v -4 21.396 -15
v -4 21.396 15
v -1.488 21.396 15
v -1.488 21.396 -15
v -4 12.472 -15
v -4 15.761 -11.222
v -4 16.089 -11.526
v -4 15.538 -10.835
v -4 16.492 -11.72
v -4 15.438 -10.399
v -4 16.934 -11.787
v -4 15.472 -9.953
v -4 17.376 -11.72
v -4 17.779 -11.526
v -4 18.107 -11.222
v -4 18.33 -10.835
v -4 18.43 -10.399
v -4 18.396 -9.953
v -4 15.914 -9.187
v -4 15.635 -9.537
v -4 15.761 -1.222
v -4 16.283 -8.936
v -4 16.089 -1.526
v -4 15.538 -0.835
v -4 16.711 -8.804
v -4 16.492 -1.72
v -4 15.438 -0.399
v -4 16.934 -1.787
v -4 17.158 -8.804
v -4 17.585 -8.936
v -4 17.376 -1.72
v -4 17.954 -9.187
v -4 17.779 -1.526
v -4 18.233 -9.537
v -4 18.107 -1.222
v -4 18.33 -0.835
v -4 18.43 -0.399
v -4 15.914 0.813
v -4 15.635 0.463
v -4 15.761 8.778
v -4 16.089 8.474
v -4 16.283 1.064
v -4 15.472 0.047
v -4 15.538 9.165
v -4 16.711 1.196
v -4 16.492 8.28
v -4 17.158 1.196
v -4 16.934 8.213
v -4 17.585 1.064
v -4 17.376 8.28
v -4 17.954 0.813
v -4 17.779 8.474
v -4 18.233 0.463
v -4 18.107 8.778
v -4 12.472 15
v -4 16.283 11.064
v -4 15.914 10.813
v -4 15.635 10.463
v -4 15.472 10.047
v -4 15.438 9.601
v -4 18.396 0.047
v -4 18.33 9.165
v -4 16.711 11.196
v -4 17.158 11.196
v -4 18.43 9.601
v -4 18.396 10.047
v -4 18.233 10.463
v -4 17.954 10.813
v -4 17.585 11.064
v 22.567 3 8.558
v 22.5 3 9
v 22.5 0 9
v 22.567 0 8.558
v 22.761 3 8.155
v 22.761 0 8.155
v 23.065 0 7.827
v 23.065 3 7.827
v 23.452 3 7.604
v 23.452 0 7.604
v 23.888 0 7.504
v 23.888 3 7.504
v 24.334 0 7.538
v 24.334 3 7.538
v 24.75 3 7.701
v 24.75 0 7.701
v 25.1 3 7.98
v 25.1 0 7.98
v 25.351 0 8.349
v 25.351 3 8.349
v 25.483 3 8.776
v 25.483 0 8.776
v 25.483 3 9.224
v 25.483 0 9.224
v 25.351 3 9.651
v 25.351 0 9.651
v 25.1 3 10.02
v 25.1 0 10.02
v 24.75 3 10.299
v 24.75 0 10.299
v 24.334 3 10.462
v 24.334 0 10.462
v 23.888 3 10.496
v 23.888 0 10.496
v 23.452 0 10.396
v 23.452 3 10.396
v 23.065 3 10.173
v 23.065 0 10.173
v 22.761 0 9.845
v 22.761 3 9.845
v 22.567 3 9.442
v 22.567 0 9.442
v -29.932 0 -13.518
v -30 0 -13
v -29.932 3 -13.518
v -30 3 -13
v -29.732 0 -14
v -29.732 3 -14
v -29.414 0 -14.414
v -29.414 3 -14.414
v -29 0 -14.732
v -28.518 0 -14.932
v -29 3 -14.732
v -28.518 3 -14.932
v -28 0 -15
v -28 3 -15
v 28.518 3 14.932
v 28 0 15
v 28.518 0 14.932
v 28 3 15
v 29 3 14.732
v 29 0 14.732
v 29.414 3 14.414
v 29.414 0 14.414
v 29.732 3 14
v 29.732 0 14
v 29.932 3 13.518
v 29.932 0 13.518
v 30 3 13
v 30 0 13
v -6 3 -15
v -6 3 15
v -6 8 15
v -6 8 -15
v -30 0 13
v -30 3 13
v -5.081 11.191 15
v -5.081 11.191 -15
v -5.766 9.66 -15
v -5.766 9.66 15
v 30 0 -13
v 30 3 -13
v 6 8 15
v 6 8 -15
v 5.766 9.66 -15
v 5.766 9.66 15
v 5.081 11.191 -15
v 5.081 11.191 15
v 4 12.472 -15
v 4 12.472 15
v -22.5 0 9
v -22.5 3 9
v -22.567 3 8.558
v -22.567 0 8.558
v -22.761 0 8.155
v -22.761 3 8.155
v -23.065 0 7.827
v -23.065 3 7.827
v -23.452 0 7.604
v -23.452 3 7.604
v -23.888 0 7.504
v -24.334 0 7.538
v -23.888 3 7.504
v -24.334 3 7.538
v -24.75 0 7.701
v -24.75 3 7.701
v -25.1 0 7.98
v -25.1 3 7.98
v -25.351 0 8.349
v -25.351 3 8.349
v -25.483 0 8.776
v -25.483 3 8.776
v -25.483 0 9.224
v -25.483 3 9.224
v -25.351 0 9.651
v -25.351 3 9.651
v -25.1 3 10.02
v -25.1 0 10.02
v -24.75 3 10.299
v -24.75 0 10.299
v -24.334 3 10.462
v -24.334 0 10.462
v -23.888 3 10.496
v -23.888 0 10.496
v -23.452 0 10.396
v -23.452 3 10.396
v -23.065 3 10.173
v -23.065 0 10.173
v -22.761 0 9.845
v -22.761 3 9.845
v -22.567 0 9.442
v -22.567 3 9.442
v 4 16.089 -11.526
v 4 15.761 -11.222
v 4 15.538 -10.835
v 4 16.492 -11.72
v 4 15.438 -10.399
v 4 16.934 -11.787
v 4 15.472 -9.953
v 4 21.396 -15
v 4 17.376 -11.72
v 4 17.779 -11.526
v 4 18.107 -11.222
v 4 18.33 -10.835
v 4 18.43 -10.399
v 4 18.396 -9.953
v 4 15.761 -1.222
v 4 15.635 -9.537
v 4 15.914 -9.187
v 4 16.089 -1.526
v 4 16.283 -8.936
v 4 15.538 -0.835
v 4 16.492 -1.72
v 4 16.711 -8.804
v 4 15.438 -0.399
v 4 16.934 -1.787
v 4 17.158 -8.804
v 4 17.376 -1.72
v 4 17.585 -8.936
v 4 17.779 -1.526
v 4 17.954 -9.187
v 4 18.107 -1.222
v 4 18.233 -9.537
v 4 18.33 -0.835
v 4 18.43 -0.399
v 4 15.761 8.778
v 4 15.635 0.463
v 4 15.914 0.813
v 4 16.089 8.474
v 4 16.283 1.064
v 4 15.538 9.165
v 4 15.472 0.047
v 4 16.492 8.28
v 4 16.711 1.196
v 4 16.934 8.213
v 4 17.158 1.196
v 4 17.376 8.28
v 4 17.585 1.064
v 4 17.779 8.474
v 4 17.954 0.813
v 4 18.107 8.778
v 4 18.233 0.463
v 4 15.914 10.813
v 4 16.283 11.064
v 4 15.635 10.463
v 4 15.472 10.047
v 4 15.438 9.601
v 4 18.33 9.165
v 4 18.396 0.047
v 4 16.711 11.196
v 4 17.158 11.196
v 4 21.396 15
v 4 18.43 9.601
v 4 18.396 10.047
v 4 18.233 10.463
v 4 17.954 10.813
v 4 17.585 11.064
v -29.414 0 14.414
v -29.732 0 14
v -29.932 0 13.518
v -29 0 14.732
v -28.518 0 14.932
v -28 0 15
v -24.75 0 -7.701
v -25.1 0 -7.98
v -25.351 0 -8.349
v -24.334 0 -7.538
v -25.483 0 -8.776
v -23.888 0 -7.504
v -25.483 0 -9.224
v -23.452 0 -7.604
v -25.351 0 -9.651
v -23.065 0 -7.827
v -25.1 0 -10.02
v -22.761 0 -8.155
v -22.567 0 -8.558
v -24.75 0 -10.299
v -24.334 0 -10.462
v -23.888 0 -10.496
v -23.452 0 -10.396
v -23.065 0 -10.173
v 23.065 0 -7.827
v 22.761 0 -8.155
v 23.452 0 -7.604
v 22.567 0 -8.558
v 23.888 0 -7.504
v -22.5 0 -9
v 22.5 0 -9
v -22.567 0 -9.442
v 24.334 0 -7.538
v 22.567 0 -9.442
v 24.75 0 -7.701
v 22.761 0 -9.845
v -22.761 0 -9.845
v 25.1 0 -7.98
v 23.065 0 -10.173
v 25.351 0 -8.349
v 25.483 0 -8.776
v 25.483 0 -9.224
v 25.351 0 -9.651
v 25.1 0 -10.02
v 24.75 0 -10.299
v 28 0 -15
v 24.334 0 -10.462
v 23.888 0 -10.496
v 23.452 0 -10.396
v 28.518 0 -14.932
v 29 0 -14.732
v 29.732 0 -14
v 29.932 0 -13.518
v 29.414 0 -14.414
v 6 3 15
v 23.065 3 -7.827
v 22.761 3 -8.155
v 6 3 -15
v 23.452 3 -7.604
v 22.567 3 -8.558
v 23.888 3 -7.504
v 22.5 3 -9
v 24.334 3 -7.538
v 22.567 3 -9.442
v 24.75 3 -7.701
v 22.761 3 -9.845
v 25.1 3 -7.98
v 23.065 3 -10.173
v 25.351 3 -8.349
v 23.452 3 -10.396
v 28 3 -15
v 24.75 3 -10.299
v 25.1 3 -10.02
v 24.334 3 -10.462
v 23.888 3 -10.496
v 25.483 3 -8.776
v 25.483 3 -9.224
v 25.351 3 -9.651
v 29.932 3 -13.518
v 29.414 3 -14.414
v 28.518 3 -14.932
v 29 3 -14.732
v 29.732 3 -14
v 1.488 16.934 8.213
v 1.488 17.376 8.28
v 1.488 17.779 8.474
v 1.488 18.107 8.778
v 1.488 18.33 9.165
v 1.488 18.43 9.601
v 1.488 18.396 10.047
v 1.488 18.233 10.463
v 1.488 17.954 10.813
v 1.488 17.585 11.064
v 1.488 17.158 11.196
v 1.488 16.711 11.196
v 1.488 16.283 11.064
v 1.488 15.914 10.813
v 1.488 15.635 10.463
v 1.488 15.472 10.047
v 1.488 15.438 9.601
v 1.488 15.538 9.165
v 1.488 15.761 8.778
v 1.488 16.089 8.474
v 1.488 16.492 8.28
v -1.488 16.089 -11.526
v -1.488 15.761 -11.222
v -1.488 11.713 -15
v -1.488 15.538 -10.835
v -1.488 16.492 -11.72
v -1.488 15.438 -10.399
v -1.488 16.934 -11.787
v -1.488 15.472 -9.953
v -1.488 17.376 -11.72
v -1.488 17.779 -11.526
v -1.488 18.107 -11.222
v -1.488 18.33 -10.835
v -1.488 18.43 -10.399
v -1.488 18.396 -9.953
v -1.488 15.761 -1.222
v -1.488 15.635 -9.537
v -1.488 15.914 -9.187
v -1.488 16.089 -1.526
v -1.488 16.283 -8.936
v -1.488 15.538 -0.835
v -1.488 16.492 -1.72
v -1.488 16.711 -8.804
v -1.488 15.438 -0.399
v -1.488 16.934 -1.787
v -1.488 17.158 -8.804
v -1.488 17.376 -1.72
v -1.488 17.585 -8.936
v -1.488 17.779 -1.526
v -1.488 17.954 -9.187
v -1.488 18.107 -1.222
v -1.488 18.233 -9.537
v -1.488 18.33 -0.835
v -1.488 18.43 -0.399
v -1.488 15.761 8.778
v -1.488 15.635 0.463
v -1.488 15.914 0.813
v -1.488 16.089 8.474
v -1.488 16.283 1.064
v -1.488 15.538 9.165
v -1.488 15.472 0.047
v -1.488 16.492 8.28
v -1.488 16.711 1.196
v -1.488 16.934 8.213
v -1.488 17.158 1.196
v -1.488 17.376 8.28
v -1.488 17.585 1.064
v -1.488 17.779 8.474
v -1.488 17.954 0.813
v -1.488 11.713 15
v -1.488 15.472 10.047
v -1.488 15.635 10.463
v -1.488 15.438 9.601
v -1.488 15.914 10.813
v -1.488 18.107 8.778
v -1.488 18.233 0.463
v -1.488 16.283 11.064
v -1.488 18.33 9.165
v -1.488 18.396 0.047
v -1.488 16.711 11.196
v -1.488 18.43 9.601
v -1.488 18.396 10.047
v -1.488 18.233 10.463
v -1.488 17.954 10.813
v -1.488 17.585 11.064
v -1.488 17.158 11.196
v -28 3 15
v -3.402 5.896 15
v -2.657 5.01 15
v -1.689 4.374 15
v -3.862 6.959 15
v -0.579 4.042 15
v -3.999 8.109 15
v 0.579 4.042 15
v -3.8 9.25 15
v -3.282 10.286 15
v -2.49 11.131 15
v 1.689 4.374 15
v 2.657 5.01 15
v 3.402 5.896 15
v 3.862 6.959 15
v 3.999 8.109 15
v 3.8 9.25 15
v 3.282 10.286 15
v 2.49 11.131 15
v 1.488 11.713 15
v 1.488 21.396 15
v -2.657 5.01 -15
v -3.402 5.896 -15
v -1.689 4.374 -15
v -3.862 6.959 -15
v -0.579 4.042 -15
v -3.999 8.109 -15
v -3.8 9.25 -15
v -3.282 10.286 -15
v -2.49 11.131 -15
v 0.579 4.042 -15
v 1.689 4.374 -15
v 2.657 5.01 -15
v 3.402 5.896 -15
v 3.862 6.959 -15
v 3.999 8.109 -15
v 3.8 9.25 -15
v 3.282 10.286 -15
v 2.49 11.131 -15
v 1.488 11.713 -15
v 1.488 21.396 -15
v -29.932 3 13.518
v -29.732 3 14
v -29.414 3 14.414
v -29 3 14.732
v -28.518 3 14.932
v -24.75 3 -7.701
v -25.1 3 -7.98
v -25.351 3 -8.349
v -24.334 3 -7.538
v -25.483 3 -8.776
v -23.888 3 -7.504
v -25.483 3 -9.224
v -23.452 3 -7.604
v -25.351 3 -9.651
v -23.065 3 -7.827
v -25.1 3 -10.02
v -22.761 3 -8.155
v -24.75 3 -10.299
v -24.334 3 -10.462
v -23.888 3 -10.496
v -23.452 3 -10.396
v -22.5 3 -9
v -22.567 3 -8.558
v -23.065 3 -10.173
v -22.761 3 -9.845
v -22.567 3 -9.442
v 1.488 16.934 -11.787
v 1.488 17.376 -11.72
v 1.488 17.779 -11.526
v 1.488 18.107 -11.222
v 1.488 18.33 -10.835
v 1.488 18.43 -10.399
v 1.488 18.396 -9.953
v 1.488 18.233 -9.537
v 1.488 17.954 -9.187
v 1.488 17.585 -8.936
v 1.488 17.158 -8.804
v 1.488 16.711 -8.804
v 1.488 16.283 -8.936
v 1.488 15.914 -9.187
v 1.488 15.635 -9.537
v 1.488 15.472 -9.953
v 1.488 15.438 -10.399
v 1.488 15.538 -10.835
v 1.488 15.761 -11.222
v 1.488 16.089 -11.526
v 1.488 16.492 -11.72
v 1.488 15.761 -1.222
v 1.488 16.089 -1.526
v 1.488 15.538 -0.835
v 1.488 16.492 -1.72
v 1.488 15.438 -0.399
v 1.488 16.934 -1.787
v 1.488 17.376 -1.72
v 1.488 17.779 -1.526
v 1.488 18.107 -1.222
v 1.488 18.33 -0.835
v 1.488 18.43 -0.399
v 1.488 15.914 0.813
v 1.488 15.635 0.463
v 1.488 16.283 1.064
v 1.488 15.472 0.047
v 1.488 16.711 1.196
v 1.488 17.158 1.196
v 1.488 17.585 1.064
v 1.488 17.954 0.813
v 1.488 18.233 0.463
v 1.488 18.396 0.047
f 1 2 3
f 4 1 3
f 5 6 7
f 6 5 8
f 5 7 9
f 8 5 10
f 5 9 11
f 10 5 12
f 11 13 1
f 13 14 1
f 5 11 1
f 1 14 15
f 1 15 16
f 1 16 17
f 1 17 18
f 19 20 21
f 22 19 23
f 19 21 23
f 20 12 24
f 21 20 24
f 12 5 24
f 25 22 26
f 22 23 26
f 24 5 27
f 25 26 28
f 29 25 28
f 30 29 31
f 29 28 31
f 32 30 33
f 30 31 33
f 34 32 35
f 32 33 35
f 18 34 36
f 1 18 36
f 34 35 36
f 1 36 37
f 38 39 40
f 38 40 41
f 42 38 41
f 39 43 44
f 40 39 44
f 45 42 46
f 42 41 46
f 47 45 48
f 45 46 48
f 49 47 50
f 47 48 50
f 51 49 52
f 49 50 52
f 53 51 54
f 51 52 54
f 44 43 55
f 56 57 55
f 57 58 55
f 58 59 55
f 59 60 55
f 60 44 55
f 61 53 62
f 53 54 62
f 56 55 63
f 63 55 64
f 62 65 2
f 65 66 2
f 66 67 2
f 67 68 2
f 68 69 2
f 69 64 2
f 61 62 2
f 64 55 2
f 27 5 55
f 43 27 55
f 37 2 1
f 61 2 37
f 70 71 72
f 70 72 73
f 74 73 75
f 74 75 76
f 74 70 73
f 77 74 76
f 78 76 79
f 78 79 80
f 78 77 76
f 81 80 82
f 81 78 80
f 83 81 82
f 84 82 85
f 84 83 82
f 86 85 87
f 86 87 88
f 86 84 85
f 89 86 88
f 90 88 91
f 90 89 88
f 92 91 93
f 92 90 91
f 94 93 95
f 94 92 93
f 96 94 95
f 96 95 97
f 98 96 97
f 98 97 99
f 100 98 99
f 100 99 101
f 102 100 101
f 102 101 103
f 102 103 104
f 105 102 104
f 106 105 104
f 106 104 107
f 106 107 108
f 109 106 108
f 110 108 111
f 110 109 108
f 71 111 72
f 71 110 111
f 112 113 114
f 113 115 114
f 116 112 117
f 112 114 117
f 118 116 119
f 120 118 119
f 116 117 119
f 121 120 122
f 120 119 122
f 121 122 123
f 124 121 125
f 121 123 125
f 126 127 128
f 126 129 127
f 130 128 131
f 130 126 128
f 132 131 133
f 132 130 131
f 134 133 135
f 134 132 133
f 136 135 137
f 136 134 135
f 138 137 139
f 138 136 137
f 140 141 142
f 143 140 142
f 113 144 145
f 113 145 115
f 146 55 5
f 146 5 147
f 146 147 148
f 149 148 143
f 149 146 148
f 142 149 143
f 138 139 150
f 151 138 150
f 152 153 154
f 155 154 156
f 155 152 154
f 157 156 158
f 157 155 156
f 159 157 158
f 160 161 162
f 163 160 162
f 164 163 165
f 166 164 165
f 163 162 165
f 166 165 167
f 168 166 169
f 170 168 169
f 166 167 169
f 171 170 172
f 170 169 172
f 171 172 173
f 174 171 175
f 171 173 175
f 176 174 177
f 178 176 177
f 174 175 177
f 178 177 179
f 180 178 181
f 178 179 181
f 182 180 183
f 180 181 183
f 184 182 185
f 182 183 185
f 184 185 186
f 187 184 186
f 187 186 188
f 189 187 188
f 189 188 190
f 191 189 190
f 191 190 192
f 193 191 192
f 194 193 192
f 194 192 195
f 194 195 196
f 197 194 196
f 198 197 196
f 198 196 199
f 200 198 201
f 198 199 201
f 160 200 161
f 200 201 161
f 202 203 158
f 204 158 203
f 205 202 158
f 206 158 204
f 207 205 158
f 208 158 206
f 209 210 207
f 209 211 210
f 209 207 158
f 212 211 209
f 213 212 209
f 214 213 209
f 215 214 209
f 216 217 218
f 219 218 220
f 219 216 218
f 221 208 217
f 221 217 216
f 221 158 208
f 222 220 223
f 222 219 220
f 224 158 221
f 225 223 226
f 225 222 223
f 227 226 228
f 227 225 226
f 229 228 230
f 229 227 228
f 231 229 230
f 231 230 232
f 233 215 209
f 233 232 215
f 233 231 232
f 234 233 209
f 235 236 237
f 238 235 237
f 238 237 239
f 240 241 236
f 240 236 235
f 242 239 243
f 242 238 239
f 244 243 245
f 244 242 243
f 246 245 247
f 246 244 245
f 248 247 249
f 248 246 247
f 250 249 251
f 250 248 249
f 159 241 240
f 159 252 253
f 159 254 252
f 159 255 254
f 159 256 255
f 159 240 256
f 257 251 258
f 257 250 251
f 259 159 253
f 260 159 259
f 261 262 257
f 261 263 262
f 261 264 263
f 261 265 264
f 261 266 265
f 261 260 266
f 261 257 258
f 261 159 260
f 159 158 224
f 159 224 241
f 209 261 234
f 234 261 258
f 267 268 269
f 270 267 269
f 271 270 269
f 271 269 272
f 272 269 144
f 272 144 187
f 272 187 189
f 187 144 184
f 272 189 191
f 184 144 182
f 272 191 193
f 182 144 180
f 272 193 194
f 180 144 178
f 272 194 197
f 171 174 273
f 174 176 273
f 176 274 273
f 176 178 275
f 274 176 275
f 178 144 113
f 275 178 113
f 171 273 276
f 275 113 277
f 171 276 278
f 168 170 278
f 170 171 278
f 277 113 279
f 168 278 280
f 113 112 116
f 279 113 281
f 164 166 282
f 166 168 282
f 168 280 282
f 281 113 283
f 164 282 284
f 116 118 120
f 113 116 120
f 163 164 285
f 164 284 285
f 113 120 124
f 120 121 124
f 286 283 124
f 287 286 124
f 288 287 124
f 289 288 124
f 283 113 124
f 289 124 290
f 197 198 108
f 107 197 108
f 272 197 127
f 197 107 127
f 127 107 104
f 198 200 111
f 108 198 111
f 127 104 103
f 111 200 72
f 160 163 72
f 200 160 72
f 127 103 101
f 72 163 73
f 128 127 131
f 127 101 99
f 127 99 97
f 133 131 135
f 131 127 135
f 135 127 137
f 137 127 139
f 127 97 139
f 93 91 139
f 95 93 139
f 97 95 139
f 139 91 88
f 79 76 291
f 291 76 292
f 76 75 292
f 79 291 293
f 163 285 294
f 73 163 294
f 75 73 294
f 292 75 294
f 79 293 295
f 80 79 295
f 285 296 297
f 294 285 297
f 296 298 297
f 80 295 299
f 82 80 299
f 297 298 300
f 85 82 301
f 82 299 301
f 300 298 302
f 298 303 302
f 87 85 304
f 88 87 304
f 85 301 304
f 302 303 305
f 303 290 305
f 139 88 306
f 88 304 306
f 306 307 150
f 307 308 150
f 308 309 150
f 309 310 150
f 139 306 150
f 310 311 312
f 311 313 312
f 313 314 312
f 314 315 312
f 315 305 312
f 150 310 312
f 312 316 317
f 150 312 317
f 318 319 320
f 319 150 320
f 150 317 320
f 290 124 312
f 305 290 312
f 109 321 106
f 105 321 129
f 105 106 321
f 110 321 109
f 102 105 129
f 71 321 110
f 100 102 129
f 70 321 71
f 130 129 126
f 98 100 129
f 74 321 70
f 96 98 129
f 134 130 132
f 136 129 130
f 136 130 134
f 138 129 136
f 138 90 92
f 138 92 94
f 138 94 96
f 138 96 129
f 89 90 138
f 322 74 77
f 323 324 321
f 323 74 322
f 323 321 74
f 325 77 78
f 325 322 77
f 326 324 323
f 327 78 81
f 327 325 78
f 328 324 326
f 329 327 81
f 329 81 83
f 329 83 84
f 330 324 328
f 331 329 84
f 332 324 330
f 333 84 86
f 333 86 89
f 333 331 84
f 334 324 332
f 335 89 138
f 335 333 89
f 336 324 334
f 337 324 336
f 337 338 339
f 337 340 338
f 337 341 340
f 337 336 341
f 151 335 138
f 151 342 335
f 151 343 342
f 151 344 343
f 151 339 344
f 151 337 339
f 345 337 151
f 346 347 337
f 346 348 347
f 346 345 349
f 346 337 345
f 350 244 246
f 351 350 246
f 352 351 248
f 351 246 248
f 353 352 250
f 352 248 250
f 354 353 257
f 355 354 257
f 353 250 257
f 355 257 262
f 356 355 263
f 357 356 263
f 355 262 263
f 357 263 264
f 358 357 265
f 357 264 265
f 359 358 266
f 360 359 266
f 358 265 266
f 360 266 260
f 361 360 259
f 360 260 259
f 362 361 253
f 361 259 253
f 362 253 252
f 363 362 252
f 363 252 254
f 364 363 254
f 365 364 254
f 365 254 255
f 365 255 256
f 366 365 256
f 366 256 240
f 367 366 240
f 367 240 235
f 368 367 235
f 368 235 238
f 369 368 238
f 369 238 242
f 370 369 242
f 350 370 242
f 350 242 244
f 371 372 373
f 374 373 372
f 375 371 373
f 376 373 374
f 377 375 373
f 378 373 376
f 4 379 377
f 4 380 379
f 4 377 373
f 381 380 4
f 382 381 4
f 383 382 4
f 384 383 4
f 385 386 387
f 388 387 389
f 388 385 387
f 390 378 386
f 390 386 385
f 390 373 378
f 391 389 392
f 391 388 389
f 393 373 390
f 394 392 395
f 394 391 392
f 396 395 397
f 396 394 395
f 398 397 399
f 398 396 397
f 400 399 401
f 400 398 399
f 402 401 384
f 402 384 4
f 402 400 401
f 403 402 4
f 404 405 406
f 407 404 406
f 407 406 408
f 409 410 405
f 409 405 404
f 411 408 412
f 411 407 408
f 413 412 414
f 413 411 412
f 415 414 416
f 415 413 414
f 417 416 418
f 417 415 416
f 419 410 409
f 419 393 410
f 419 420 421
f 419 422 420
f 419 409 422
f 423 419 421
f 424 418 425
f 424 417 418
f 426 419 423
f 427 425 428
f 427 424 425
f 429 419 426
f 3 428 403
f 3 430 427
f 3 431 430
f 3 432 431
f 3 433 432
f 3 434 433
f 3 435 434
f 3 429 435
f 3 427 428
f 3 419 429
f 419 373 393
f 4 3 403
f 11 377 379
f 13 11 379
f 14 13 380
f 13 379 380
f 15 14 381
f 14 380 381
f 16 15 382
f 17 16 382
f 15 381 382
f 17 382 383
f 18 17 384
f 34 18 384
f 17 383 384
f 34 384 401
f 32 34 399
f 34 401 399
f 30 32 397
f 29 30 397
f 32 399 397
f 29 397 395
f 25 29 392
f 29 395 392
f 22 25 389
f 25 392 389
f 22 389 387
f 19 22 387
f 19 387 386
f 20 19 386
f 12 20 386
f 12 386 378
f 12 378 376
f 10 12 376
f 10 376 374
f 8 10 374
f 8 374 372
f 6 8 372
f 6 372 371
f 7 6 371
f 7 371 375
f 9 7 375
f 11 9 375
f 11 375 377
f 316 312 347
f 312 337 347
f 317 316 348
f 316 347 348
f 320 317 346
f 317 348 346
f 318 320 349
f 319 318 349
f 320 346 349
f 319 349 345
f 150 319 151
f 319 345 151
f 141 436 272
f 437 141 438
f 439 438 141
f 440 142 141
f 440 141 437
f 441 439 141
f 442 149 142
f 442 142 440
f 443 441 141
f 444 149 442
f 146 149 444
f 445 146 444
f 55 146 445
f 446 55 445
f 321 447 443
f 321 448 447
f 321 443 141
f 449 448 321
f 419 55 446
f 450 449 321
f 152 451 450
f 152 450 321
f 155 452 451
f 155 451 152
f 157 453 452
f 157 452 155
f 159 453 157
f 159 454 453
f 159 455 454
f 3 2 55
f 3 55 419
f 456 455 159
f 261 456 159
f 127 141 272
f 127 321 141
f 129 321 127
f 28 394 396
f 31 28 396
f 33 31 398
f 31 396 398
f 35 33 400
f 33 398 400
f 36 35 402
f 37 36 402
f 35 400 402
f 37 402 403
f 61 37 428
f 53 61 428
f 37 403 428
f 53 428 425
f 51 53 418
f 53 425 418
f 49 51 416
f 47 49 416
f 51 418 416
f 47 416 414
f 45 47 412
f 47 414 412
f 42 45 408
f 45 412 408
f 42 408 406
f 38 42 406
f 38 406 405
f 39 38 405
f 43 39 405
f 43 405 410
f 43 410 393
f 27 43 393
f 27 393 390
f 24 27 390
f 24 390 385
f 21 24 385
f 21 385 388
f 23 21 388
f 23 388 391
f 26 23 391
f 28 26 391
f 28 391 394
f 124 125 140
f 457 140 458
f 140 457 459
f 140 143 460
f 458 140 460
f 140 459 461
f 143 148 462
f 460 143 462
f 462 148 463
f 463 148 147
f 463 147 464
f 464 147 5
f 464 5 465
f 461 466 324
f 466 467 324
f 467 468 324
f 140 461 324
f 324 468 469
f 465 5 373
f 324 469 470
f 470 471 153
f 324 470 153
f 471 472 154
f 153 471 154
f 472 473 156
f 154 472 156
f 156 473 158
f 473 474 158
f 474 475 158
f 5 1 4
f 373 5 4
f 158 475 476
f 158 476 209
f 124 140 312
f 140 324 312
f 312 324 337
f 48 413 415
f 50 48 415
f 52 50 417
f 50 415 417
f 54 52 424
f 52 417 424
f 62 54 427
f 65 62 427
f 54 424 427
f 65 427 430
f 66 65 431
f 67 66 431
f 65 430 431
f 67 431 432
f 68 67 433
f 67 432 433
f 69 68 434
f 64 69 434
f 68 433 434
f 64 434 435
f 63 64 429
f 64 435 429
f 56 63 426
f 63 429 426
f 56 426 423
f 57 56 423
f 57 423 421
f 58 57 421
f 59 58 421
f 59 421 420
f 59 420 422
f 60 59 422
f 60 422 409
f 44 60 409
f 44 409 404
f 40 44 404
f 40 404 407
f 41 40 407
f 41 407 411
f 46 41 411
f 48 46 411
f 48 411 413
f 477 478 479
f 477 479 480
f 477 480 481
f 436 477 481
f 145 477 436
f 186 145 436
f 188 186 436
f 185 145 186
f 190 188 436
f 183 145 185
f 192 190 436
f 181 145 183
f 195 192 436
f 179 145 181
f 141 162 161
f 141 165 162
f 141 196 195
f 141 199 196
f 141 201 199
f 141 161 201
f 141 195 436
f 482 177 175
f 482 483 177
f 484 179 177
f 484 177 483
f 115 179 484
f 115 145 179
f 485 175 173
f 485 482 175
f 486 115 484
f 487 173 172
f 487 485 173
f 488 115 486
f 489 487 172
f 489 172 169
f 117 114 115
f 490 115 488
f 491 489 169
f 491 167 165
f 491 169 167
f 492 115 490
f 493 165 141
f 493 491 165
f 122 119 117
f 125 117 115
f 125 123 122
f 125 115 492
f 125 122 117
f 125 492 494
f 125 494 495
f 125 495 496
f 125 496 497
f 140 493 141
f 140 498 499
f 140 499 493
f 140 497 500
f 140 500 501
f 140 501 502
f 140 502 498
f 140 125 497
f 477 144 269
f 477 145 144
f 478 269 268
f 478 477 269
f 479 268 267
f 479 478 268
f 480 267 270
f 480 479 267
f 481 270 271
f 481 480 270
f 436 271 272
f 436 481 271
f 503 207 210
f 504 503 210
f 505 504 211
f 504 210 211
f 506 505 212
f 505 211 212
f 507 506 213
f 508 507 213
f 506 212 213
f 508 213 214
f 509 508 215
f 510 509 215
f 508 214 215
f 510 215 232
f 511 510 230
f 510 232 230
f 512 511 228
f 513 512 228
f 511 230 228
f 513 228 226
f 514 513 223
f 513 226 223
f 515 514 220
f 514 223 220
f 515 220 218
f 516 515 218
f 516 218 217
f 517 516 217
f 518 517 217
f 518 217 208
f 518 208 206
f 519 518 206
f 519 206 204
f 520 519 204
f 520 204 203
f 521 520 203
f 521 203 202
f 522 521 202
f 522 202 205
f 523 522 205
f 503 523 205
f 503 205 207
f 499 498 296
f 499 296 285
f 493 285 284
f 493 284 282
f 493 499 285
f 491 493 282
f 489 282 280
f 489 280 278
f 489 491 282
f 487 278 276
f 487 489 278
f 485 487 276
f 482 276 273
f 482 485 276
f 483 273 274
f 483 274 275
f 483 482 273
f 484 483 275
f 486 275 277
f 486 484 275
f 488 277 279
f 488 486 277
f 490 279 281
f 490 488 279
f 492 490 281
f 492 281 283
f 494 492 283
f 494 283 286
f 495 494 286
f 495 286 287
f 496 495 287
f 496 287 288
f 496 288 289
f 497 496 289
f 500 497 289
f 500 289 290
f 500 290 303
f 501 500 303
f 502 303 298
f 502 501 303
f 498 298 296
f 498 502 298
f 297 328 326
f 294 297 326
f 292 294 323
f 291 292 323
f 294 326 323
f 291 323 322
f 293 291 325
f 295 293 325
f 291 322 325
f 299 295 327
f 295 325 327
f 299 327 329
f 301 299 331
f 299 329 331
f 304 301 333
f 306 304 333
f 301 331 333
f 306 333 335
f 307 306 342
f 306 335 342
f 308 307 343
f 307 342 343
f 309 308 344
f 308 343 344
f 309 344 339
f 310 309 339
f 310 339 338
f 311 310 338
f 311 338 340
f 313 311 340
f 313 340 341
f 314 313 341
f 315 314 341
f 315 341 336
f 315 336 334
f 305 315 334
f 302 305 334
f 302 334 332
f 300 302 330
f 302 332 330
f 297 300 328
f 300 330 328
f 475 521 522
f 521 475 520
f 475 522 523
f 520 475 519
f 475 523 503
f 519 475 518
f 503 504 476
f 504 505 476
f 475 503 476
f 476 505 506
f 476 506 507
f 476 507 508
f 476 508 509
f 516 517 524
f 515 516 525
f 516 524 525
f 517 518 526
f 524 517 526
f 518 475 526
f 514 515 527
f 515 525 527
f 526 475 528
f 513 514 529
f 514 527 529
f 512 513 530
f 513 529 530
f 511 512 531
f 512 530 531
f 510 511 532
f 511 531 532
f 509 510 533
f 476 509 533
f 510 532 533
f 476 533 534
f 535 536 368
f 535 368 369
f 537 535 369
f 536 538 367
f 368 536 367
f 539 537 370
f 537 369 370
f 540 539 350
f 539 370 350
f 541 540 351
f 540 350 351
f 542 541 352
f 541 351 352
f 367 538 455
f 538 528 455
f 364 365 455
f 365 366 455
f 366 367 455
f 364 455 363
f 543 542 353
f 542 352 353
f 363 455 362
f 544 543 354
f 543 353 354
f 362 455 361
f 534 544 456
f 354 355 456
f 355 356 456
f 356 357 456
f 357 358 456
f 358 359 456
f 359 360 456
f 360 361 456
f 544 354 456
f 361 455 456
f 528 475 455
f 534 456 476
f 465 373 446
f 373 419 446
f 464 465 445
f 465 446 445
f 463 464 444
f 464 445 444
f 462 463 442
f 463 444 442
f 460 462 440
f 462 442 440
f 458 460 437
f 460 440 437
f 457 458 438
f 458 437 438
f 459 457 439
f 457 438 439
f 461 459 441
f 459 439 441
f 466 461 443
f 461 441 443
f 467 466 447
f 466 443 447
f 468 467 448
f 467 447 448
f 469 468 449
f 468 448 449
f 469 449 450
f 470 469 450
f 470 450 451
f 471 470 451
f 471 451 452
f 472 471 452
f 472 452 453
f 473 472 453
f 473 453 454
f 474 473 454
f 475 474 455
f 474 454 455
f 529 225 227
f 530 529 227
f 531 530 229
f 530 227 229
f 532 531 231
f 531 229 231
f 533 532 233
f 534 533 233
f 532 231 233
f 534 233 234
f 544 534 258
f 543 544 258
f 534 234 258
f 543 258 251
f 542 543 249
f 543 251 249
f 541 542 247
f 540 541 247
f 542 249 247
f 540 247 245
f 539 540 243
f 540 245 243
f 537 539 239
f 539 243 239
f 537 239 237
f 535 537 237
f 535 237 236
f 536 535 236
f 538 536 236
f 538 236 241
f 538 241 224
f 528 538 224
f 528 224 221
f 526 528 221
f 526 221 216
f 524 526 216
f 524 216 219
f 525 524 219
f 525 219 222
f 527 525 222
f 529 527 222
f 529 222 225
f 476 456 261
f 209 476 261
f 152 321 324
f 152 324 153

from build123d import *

# Parameters (mm, degrees)
SKETCH_1_W               = 60
SKETCH_1_H               = 30
EXTRUDE_1_DEPTH          = 3
SKETCH_2_R               = 1.5
CUT_EXTRUDE_1_DEPTH      = 3
MIRROR_2_COPY_1_SKETCH_R = 1.5
MIRROR_2_COPY_1_DEPTH    = 3
FILLET_2_R               = 2
SKETCH_5_R               = 6
EXTRUDE_2_DEPTH          = 30
SKETCH_6_W               = 12
SKETCH_6_H               = 5
EXTRUDE_3_DEPTH          = 30
SKETCH_7_R               = 4
CUT_EXTRUDE_4_DEPTH      = 31
SKETCH_8_W               = 8
SKETCH_8_H               = 9.1545719
EXTRUDE_4_DEPTH          = 30
SKETCH_9_W               = 2.976845738
SKETCH_9_H               = 12.85930144
CUT_EXTRUDE_5_DEPTH      = 31
SKETCH_10_R              = 1.5
CUT_EXTRUDE_6_DEPTH      = 35


with BuildPart() as part:
    # 草图1 → 凸台-拉伸1 (new body)
    with BuildSketch(Plane(origin=(0, 0, 0), x_dir=(1, 0, 0), z_dir=(0, 1, 0))):
        Rectangle(SKETCH_1_W, SKETCH_1_H)
    extrude(amount=EXTRUDE_1_DEPTH)

    # 草图2 → 切除-拉伸1 (cut)
    with BuildSketch(Plane(origin=(0, 3, 0), x_dir=(1, 0, 0), z_dir=(0, 1, 0))):
        with Locations((-24, -9)):
            Circle(SKETCH_2_R)
    cut_extrude_1 = extrude(amount=-CUT_EXTRUDE_1_DEPTH, mode=Mode.SUBTRACT)

    # 镜向1: 切除-拉伸1 across plane
    add(cut_extrude_1.mirror(Plane.XY), mode=Mode.SUBTRACT)

    # 镜向2: 切除-拉伸1 across plane
    add(cut_extrude_1.mirror(Plane(origin=(0, 0, 0), x_dir=(0, 0, 1), z_dir=(1, 0, 0))), mode=Mode.SUBTRACT)

    # 镜向2 copy 1 sketch → 镜向2 copy 1 (cut)
    with BuildSketch(Plane(origin=(0, 3, 0), x_dir=(-1, 0, 0), z_dir=(0, 1, 0))):
        with Locations((-24, -9)):
            Circle(MIRROR_2_COPY_1_SKETCH_R)
    extrude(amount=-MIRROR_2_COPY_1_DEPTH, mode=Mode.SUBTRACT)

    # 圆角2
    fillet_2_edges = [part.edges().sort_by_distance(p)[0] for p in [
        (-30, 1.5, -15),
        (30, 1.5, -15),
        (30, 1.5, 15),
        (-30, 1.5, 15),
    ]]
    fillet(fillet_2_edges, radius=FILLET_2_R)

    # 草图5 → 凸台-拉伸2 (add)
    with BuildSketch(Plane.XY.offset(15)):
        with Locations((0, 8)):
            Circle(SKETCH_5_R)
    extrude(amount=-EXTRUDE_2_DEPTH)

    # 草图6 → 凸台-拉伸3 (add)
    with BuildSketch(Plane.XY.offset(15)):
        with Locations((0, 5.5)):
            Rectangle(SKETCH_6_W, SKETCH_6_H)
    extrude(amount=-EXTRUDE_3_DEPTH)

    # 草图7 → 切除-拉伸4 (cut, through all)
    with BuildSketch(Plane.XY.offset(15)):
        with Locations((0, 8)):
            Circle(SKETCH_7_R)
    extrude(amount=-CUT_EXTRUDE_4_DEPTH, mode=Mode.SUBTRACT)

    # 草图8 → 凸台-拉伸4 (add)
    with BuildSketch(Plane.XY.offset(15)):
        with Locations((0, 16.818752798)):
            Rectangle(SKETCH_8_W, SKETCH_8_H)
    extrude(amount=-EXTRUDE_4_DEPTH)

    # 草图9 → 切除-拉伸5 (cut, through all)
    with BuildSketch(Plane.XY.offset(15)):
        with Locations((0, 16.396965649)):
            Rectangle(SKETCH_9_W, SKETCH_9_H)
    extrude(amount=-CUT_EXTRUDE_5_DEPTH, mode=Mode.SUBTRACT)

    # 草图10 → 切除-拉伸6 (cut, through all)
    with BuildSketch(Plane(origin=(4, 0, 0), x_dir=(0, 0, -1), z_dir=(1, 0, 0))):
        with Locations((10.28698243, 16.934087351)):
            Circle(SKETCH_10_R)
        with Locations((0.28698243, 16.934087351)):
            Circle(SKETCH_10_R)
        with Locations((-9.71301757, 16.934087351)):
            Circle(SKETCH_10_R)
    extrude(amount=-CUT_EXTRUDE_6_DEPTH, mode=Mode.SUBTRACT)


solid = part.part
